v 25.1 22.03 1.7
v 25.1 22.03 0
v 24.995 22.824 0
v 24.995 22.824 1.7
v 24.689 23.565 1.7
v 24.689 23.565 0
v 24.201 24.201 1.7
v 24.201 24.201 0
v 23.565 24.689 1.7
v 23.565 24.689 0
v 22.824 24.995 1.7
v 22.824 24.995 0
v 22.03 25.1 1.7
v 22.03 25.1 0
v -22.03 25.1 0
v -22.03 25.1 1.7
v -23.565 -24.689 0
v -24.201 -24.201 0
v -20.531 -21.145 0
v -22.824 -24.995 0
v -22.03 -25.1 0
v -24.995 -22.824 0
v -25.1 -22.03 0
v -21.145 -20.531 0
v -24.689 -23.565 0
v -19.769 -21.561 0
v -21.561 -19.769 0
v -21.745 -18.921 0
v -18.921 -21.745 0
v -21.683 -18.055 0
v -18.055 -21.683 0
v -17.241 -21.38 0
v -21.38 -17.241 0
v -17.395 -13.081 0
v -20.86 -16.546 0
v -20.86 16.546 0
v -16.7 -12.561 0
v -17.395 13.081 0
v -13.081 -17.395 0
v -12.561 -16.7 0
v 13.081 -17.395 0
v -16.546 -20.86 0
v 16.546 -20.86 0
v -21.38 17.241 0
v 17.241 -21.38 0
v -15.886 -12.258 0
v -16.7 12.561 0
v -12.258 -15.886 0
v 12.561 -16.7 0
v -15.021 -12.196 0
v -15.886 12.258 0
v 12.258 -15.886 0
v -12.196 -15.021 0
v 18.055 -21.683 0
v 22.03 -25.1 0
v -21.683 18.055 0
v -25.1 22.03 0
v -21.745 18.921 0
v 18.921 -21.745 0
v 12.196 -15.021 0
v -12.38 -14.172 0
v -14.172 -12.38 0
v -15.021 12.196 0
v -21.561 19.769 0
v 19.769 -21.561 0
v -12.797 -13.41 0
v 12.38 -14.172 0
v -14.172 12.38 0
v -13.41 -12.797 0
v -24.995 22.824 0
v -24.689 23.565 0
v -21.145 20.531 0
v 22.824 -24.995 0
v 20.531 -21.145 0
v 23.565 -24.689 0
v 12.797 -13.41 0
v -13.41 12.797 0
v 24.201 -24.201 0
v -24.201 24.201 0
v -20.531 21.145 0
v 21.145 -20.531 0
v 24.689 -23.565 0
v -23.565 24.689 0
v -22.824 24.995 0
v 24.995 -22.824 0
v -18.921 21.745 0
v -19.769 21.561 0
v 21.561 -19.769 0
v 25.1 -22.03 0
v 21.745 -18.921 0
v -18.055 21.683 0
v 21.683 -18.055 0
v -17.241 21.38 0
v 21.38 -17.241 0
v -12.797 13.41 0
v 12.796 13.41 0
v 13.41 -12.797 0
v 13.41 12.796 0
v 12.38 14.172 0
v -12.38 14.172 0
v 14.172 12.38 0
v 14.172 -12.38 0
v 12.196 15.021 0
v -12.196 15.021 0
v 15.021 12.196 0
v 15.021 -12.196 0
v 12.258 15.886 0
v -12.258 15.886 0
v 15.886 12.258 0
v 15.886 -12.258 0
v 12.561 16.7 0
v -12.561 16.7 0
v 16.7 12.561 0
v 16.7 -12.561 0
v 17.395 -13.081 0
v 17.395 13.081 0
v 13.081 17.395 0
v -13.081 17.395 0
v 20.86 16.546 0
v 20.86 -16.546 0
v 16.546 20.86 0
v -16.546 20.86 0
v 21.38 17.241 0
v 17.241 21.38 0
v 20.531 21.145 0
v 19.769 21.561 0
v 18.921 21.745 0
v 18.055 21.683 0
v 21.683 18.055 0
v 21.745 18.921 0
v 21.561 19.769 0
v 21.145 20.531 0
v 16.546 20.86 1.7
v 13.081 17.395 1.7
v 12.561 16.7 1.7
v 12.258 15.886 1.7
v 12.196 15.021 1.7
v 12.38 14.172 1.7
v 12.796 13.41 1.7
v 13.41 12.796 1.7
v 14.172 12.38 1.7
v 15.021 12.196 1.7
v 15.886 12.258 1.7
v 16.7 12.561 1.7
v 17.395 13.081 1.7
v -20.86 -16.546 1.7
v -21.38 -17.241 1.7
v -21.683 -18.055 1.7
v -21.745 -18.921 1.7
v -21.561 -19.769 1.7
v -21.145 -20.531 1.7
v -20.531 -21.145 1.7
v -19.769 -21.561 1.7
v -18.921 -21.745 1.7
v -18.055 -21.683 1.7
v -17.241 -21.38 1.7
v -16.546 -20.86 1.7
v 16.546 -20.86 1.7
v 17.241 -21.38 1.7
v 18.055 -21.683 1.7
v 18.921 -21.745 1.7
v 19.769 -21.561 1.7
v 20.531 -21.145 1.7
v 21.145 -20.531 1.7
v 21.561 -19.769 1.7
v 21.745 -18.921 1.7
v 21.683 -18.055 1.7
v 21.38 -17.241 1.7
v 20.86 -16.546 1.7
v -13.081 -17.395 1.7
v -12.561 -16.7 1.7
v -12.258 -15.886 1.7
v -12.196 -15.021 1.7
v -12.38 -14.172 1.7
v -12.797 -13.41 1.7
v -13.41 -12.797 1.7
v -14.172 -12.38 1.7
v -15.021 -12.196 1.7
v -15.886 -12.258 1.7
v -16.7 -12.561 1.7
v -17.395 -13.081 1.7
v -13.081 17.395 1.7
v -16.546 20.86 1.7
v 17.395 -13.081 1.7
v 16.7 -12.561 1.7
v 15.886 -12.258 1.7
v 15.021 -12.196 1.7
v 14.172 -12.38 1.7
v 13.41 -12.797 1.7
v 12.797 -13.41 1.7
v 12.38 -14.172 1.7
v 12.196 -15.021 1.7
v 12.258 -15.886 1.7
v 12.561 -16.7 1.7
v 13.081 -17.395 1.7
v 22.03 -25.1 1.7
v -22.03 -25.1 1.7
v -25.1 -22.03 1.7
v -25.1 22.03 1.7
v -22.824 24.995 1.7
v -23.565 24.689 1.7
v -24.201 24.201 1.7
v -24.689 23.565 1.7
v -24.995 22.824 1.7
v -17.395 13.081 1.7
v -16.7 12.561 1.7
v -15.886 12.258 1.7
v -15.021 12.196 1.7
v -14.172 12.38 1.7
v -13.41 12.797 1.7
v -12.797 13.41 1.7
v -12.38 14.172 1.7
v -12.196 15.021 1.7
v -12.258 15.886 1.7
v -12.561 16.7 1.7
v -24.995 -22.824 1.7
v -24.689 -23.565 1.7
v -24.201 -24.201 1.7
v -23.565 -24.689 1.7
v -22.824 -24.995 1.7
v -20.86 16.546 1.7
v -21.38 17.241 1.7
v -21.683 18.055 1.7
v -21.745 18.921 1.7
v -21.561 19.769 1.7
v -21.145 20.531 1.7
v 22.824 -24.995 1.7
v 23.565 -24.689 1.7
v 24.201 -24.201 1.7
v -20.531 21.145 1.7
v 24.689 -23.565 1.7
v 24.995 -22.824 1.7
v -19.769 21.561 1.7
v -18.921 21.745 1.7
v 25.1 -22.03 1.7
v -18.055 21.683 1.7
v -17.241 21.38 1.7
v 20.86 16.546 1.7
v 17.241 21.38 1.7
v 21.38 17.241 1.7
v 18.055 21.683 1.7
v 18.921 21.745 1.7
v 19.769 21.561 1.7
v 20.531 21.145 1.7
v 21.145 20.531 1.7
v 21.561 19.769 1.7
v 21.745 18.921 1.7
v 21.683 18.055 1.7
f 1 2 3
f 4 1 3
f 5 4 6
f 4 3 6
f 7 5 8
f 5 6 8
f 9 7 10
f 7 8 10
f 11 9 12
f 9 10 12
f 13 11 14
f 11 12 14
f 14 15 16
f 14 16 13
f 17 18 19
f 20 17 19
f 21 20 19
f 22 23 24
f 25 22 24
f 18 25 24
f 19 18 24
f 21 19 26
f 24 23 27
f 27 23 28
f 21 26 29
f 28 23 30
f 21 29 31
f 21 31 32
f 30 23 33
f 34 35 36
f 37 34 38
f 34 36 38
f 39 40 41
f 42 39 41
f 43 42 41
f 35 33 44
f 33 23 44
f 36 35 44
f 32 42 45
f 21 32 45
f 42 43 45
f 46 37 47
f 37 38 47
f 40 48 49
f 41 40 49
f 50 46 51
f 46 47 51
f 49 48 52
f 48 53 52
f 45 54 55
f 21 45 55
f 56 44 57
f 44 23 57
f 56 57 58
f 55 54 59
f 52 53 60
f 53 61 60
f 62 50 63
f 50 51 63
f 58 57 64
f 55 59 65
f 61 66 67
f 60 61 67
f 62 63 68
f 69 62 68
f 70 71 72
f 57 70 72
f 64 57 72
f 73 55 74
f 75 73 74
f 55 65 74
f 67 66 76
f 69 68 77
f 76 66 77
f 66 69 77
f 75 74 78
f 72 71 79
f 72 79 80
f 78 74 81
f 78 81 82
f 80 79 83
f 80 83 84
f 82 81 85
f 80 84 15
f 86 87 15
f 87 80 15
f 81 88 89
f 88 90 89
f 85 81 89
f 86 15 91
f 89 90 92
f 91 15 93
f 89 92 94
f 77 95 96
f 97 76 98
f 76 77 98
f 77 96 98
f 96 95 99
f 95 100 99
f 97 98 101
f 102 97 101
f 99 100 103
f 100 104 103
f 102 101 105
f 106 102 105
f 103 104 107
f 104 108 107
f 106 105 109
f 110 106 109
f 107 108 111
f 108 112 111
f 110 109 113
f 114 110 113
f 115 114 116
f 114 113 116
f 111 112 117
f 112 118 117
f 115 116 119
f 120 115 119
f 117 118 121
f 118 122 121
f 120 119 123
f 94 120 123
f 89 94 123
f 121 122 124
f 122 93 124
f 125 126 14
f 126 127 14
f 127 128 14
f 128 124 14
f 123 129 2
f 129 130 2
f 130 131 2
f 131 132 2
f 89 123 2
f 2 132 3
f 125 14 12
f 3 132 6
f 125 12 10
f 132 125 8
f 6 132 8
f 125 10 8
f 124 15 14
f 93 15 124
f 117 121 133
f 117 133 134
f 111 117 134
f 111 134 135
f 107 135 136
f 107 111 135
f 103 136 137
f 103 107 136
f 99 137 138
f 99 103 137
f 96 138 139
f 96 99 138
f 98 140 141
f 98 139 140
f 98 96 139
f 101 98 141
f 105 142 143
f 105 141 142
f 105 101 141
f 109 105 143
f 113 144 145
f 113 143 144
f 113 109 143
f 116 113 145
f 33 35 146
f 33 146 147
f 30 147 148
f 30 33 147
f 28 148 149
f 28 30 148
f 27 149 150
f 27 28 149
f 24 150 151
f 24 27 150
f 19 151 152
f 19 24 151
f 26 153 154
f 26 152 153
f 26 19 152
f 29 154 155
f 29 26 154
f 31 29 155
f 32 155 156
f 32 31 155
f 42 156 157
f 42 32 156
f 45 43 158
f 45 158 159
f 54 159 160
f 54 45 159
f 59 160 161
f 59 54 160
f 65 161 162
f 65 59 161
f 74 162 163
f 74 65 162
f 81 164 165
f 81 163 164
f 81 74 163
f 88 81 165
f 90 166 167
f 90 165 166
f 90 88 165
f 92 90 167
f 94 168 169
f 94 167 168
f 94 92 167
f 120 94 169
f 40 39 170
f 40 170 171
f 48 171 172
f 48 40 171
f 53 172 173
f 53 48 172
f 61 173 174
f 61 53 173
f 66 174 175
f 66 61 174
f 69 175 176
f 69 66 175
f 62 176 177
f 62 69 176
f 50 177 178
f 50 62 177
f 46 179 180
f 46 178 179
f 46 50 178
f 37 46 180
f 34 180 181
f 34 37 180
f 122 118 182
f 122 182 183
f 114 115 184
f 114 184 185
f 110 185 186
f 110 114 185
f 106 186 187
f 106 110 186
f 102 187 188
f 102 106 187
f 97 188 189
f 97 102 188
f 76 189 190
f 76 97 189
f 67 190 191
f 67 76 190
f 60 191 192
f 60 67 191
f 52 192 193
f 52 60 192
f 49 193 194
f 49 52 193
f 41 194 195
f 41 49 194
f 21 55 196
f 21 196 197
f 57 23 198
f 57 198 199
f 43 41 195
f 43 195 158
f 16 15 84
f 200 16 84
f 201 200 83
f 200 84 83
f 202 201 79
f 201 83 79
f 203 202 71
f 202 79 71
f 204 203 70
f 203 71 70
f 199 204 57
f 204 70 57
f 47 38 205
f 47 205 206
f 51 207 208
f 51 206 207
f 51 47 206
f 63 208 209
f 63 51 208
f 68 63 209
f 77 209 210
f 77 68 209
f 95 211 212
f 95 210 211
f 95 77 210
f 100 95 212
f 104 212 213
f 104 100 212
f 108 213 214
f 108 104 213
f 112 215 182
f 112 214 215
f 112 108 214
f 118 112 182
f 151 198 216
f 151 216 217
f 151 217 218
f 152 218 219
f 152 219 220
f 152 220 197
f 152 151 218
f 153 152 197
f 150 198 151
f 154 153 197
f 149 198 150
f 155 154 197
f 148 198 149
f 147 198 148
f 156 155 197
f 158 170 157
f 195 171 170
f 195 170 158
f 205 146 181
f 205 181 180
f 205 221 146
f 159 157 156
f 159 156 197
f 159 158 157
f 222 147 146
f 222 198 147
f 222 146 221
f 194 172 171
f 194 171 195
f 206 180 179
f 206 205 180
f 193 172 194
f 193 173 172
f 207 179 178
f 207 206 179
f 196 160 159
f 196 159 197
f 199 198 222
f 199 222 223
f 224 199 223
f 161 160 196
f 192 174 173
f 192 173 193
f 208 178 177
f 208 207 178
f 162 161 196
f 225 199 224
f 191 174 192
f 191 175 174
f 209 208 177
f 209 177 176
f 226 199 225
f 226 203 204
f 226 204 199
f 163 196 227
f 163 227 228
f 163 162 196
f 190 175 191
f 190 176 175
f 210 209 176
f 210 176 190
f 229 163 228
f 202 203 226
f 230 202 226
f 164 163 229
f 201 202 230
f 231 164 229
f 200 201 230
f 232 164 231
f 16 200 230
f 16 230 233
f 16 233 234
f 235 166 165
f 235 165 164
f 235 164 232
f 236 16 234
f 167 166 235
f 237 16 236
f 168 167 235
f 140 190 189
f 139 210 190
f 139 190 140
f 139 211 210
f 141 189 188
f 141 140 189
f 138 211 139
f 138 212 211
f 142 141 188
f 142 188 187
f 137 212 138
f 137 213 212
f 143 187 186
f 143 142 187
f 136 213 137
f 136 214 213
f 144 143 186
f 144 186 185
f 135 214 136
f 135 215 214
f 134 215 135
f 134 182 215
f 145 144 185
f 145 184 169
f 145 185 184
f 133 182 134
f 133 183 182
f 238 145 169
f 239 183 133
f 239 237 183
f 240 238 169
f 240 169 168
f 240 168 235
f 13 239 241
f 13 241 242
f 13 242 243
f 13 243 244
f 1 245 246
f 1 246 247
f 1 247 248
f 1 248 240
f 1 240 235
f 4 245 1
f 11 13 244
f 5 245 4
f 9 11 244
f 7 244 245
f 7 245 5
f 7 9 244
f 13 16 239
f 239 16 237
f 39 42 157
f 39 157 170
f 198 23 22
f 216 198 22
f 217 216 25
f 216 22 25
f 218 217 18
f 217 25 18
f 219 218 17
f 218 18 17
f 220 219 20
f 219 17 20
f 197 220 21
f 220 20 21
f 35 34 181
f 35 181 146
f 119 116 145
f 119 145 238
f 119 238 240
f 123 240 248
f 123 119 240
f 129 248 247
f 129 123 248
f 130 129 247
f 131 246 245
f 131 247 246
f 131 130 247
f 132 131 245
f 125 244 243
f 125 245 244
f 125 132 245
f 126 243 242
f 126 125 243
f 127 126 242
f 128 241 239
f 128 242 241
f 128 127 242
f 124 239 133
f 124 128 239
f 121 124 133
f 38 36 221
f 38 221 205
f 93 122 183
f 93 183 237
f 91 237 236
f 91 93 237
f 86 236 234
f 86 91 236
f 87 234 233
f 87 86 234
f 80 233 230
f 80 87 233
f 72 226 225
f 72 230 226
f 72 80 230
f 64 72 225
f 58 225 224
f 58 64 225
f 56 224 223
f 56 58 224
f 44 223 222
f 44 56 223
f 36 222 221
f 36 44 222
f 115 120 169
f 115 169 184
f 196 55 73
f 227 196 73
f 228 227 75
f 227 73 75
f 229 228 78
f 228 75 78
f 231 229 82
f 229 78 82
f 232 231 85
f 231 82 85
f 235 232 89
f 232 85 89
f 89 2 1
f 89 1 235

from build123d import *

# Parameters (mm, degrees)
PAD_DEPTH         = 1.7
POCKET_DEPTH      = 0.001
POCKET_DEPTH_BACK = 1.701


with BuildPart() as part:
    # Sketch001 → Pad (new body)
    with BuildSketch(Plane.XY):
        with BuildLine():
            ThreePointArc((-25.1, -22.029699), (-24.20073, -24.20073), (-22.029699, -25.1))
            Line((22.029699, -25.1), (-22.029699, -25.1))
            ThreePointArc((22.029699, -25.1), (24.20073, -24.20073), (25.1, -22.029699))
            Line((25.1, 22.029699), (25.1, -22.029699))
            ThreePointArc((25.1, 22.029699), (24.20073, 24.20073), (22.029699, 25.1))
            Line((-22.029699, 25.1), (22.029699, 25.1))
            ThreePointArc((-22.029699, 25.1), (-24.20073, 24.20073), (-25.1, 22.029699))
            Line((-25.1, -22.029699), (-25.1, 22.029699))
        make_face()
    extrude(amount=PAD_DEPTH)

    # Binder → Pocket (cut, two sides)
    with BuildSketch(Plane(origin=(-16.970563, -16.970563, 0), x_dir=(0, 1, 0), z_dir=(0, 0, 1))) as pocket_sk:
        with BuildLine():
            ThreePointArc((0.424264, 3.889087), (-3.889087, 3.889087), (-3.889087, -0.424264))
            Line((-3.889087, -0.424264), (-0.424264, -3.889087))
            ThreePointArc((-0.424264, -3.889087), (3.889087, -3.889087), (3.889087, 0.424264))
            Line((3.889087, 0.424264), (0.424264, 3.889087))
        make_face()
        with BuildLine():
            ThreePointArc((-3.889087, -33.516861), (-3.889087, -37.830213), (0.424264, -37.830213))
            Line((0.424264, -37.830213), (3.889087, -34.36539))
            ThreePointArc((3.889087, -34.36539), (3.889087, -30.052038), (-0.424264, -30.052038))
            Line((-0.424264, -30.052038), (-3.889087, -33.516861))
        make_face()
        with BuildLine():
            ThreePointArc((37.830213, -0.424264), (37.830213, 3.889087), (33.516861, 3.889087))
            Line((33.516861, 3.889087), (30.052038, 0.424264))
            ThreePointArc((30.052038, 0.424264), (30.052038, -3.889087), (34.36539, -3.889087))
            Line((34.36539, -3.889087), (37.830213, -0.424264))
        make_face()
        with BuildLine():
            ThreePointArc((33.516861, -37.830213), (37.830213, -37.830213), (37.830213, -33.516861))
            Line((37.830213, -33.516861), (34.36539, -30.052038))
            ThreePointArc((34.36539, -30.052038), (30.052038, -30.052038), (30.052038, -34.36539))
            Line((30.052038, -34.36539), (33.516861, -37.830213))
        make_face()
    extrude(amount=-POCKET_DEPTH, mode=Mode.SUBTRACT)
    extrude(pocket_sk.sketch, amount=POCKET_DEPTH_BACK, mode=Mode.SUBTRACT)


solid = part.part
